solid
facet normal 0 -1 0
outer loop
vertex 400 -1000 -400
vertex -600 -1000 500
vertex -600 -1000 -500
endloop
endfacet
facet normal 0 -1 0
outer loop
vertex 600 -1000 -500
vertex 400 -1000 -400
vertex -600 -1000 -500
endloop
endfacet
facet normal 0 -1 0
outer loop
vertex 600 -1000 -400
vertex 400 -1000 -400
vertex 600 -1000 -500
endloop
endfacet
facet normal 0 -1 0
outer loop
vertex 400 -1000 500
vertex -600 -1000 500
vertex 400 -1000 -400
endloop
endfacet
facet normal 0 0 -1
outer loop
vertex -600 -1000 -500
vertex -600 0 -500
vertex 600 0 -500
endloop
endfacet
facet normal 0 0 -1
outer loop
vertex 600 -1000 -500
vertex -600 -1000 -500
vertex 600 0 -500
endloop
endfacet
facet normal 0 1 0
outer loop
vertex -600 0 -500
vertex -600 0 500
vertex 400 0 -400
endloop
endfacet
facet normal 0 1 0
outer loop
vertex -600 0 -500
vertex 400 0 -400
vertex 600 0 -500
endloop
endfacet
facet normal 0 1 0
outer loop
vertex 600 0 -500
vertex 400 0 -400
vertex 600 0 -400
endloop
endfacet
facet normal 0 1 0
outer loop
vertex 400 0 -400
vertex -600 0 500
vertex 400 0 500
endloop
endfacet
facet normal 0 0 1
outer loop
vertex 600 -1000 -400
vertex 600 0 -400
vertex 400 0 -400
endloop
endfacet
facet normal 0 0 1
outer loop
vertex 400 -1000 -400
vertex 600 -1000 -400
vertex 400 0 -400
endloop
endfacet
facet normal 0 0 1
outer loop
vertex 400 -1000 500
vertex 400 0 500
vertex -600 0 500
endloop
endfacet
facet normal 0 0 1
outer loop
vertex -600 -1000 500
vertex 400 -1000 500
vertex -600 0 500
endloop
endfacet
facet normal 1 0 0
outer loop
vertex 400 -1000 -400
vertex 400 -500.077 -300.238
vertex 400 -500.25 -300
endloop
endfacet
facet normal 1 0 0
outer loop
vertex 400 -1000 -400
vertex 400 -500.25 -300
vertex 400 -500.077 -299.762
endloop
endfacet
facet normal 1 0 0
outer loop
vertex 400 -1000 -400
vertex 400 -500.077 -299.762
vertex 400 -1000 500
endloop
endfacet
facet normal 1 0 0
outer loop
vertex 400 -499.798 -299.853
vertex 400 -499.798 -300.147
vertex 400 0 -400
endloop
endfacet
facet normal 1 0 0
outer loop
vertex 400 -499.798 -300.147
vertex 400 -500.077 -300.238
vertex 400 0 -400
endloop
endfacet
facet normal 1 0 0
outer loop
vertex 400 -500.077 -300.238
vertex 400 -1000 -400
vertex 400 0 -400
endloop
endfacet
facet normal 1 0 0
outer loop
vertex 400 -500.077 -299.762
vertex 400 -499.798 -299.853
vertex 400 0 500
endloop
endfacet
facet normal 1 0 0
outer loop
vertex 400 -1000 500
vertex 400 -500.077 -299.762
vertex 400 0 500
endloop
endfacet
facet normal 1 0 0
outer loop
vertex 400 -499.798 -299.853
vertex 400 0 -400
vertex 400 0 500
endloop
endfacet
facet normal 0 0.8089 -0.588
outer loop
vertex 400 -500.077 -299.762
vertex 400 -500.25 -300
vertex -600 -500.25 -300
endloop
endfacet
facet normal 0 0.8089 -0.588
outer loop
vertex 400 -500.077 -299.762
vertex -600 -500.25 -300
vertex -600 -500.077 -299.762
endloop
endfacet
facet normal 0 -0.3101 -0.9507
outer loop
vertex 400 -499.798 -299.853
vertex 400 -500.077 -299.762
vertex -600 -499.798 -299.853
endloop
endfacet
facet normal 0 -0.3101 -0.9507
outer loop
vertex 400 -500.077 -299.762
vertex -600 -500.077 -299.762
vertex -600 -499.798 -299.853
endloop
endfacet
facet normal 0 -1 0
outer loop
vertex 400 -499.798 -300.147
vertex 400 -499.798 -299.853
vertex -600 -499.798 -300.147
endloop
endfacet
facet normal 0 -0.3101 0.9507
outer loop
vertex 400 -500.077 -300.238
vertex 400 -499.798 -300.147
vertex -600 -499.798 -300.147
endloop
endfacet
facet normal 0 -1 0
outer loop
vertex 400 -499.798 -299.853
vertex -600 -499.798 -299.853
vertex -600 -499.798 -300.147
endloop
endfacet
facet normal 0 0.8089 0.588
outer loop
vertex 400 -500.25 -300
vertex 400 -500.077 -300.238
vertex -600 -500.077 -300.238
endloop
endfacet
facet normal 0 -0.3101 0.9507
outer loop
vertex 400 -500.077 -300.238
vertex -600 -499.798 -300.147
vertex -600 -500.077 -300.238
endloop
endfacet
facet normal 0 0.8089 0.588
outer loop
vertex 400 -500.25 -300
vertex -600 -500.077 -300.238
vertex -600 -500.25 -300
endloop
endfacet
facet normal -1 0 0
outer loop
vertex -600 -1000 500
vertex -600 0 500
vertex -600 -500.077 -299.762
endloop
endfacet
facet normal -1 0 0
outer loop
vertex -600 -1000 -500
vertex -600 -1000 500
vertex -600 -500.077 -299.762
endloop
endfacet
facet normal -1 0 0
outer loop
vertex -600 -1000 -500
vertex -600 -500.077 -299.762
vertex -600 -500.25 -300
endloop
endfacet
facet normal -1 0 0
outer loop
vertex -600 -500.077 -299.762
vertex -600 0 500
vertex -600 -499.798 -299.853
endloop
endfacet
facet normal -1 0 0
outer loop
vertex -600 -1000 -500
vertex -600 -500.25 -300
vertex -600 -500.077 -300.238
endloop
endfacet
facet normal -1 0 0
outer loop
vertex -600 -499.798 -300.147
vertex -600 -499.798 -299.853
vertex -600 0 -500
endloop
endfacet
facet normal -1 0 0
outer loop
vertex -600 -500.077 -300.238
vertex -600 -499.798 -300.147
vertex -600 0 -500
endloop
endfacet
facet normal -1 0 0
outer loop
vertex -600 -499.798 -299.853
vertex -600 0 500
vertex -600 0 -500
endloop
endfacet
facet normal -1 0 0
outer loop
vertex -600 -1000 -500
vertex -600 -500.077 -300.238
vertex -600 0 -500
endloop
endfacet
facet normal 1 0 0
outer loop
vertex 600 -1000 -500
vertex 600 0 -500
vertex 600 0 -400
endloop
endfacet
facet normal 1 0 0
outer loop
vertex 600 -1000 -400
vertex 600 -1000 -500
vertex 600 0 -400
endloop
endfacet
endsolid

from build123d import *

# Parameters (mm, degrees)
F1_DEPTH = 1000
F4_D     = 0.5


with BuildPart() as f1:
    # F0 (on Front) → F1 (new body)
    with BuildSketch(Plane.XZ):
        Polygon((400, 500), (-600, 500), (-600, -500), (600, -500), (600, -400), (400, -400), align=None)
    extrude(amount=F1_DEPTH)

    # F4 (through all)
    with Locations(Plane.YZ.offset(400)):
        with Locations((-500, -300)):
            Hole(F4_D / 2)


solid = f1.part
